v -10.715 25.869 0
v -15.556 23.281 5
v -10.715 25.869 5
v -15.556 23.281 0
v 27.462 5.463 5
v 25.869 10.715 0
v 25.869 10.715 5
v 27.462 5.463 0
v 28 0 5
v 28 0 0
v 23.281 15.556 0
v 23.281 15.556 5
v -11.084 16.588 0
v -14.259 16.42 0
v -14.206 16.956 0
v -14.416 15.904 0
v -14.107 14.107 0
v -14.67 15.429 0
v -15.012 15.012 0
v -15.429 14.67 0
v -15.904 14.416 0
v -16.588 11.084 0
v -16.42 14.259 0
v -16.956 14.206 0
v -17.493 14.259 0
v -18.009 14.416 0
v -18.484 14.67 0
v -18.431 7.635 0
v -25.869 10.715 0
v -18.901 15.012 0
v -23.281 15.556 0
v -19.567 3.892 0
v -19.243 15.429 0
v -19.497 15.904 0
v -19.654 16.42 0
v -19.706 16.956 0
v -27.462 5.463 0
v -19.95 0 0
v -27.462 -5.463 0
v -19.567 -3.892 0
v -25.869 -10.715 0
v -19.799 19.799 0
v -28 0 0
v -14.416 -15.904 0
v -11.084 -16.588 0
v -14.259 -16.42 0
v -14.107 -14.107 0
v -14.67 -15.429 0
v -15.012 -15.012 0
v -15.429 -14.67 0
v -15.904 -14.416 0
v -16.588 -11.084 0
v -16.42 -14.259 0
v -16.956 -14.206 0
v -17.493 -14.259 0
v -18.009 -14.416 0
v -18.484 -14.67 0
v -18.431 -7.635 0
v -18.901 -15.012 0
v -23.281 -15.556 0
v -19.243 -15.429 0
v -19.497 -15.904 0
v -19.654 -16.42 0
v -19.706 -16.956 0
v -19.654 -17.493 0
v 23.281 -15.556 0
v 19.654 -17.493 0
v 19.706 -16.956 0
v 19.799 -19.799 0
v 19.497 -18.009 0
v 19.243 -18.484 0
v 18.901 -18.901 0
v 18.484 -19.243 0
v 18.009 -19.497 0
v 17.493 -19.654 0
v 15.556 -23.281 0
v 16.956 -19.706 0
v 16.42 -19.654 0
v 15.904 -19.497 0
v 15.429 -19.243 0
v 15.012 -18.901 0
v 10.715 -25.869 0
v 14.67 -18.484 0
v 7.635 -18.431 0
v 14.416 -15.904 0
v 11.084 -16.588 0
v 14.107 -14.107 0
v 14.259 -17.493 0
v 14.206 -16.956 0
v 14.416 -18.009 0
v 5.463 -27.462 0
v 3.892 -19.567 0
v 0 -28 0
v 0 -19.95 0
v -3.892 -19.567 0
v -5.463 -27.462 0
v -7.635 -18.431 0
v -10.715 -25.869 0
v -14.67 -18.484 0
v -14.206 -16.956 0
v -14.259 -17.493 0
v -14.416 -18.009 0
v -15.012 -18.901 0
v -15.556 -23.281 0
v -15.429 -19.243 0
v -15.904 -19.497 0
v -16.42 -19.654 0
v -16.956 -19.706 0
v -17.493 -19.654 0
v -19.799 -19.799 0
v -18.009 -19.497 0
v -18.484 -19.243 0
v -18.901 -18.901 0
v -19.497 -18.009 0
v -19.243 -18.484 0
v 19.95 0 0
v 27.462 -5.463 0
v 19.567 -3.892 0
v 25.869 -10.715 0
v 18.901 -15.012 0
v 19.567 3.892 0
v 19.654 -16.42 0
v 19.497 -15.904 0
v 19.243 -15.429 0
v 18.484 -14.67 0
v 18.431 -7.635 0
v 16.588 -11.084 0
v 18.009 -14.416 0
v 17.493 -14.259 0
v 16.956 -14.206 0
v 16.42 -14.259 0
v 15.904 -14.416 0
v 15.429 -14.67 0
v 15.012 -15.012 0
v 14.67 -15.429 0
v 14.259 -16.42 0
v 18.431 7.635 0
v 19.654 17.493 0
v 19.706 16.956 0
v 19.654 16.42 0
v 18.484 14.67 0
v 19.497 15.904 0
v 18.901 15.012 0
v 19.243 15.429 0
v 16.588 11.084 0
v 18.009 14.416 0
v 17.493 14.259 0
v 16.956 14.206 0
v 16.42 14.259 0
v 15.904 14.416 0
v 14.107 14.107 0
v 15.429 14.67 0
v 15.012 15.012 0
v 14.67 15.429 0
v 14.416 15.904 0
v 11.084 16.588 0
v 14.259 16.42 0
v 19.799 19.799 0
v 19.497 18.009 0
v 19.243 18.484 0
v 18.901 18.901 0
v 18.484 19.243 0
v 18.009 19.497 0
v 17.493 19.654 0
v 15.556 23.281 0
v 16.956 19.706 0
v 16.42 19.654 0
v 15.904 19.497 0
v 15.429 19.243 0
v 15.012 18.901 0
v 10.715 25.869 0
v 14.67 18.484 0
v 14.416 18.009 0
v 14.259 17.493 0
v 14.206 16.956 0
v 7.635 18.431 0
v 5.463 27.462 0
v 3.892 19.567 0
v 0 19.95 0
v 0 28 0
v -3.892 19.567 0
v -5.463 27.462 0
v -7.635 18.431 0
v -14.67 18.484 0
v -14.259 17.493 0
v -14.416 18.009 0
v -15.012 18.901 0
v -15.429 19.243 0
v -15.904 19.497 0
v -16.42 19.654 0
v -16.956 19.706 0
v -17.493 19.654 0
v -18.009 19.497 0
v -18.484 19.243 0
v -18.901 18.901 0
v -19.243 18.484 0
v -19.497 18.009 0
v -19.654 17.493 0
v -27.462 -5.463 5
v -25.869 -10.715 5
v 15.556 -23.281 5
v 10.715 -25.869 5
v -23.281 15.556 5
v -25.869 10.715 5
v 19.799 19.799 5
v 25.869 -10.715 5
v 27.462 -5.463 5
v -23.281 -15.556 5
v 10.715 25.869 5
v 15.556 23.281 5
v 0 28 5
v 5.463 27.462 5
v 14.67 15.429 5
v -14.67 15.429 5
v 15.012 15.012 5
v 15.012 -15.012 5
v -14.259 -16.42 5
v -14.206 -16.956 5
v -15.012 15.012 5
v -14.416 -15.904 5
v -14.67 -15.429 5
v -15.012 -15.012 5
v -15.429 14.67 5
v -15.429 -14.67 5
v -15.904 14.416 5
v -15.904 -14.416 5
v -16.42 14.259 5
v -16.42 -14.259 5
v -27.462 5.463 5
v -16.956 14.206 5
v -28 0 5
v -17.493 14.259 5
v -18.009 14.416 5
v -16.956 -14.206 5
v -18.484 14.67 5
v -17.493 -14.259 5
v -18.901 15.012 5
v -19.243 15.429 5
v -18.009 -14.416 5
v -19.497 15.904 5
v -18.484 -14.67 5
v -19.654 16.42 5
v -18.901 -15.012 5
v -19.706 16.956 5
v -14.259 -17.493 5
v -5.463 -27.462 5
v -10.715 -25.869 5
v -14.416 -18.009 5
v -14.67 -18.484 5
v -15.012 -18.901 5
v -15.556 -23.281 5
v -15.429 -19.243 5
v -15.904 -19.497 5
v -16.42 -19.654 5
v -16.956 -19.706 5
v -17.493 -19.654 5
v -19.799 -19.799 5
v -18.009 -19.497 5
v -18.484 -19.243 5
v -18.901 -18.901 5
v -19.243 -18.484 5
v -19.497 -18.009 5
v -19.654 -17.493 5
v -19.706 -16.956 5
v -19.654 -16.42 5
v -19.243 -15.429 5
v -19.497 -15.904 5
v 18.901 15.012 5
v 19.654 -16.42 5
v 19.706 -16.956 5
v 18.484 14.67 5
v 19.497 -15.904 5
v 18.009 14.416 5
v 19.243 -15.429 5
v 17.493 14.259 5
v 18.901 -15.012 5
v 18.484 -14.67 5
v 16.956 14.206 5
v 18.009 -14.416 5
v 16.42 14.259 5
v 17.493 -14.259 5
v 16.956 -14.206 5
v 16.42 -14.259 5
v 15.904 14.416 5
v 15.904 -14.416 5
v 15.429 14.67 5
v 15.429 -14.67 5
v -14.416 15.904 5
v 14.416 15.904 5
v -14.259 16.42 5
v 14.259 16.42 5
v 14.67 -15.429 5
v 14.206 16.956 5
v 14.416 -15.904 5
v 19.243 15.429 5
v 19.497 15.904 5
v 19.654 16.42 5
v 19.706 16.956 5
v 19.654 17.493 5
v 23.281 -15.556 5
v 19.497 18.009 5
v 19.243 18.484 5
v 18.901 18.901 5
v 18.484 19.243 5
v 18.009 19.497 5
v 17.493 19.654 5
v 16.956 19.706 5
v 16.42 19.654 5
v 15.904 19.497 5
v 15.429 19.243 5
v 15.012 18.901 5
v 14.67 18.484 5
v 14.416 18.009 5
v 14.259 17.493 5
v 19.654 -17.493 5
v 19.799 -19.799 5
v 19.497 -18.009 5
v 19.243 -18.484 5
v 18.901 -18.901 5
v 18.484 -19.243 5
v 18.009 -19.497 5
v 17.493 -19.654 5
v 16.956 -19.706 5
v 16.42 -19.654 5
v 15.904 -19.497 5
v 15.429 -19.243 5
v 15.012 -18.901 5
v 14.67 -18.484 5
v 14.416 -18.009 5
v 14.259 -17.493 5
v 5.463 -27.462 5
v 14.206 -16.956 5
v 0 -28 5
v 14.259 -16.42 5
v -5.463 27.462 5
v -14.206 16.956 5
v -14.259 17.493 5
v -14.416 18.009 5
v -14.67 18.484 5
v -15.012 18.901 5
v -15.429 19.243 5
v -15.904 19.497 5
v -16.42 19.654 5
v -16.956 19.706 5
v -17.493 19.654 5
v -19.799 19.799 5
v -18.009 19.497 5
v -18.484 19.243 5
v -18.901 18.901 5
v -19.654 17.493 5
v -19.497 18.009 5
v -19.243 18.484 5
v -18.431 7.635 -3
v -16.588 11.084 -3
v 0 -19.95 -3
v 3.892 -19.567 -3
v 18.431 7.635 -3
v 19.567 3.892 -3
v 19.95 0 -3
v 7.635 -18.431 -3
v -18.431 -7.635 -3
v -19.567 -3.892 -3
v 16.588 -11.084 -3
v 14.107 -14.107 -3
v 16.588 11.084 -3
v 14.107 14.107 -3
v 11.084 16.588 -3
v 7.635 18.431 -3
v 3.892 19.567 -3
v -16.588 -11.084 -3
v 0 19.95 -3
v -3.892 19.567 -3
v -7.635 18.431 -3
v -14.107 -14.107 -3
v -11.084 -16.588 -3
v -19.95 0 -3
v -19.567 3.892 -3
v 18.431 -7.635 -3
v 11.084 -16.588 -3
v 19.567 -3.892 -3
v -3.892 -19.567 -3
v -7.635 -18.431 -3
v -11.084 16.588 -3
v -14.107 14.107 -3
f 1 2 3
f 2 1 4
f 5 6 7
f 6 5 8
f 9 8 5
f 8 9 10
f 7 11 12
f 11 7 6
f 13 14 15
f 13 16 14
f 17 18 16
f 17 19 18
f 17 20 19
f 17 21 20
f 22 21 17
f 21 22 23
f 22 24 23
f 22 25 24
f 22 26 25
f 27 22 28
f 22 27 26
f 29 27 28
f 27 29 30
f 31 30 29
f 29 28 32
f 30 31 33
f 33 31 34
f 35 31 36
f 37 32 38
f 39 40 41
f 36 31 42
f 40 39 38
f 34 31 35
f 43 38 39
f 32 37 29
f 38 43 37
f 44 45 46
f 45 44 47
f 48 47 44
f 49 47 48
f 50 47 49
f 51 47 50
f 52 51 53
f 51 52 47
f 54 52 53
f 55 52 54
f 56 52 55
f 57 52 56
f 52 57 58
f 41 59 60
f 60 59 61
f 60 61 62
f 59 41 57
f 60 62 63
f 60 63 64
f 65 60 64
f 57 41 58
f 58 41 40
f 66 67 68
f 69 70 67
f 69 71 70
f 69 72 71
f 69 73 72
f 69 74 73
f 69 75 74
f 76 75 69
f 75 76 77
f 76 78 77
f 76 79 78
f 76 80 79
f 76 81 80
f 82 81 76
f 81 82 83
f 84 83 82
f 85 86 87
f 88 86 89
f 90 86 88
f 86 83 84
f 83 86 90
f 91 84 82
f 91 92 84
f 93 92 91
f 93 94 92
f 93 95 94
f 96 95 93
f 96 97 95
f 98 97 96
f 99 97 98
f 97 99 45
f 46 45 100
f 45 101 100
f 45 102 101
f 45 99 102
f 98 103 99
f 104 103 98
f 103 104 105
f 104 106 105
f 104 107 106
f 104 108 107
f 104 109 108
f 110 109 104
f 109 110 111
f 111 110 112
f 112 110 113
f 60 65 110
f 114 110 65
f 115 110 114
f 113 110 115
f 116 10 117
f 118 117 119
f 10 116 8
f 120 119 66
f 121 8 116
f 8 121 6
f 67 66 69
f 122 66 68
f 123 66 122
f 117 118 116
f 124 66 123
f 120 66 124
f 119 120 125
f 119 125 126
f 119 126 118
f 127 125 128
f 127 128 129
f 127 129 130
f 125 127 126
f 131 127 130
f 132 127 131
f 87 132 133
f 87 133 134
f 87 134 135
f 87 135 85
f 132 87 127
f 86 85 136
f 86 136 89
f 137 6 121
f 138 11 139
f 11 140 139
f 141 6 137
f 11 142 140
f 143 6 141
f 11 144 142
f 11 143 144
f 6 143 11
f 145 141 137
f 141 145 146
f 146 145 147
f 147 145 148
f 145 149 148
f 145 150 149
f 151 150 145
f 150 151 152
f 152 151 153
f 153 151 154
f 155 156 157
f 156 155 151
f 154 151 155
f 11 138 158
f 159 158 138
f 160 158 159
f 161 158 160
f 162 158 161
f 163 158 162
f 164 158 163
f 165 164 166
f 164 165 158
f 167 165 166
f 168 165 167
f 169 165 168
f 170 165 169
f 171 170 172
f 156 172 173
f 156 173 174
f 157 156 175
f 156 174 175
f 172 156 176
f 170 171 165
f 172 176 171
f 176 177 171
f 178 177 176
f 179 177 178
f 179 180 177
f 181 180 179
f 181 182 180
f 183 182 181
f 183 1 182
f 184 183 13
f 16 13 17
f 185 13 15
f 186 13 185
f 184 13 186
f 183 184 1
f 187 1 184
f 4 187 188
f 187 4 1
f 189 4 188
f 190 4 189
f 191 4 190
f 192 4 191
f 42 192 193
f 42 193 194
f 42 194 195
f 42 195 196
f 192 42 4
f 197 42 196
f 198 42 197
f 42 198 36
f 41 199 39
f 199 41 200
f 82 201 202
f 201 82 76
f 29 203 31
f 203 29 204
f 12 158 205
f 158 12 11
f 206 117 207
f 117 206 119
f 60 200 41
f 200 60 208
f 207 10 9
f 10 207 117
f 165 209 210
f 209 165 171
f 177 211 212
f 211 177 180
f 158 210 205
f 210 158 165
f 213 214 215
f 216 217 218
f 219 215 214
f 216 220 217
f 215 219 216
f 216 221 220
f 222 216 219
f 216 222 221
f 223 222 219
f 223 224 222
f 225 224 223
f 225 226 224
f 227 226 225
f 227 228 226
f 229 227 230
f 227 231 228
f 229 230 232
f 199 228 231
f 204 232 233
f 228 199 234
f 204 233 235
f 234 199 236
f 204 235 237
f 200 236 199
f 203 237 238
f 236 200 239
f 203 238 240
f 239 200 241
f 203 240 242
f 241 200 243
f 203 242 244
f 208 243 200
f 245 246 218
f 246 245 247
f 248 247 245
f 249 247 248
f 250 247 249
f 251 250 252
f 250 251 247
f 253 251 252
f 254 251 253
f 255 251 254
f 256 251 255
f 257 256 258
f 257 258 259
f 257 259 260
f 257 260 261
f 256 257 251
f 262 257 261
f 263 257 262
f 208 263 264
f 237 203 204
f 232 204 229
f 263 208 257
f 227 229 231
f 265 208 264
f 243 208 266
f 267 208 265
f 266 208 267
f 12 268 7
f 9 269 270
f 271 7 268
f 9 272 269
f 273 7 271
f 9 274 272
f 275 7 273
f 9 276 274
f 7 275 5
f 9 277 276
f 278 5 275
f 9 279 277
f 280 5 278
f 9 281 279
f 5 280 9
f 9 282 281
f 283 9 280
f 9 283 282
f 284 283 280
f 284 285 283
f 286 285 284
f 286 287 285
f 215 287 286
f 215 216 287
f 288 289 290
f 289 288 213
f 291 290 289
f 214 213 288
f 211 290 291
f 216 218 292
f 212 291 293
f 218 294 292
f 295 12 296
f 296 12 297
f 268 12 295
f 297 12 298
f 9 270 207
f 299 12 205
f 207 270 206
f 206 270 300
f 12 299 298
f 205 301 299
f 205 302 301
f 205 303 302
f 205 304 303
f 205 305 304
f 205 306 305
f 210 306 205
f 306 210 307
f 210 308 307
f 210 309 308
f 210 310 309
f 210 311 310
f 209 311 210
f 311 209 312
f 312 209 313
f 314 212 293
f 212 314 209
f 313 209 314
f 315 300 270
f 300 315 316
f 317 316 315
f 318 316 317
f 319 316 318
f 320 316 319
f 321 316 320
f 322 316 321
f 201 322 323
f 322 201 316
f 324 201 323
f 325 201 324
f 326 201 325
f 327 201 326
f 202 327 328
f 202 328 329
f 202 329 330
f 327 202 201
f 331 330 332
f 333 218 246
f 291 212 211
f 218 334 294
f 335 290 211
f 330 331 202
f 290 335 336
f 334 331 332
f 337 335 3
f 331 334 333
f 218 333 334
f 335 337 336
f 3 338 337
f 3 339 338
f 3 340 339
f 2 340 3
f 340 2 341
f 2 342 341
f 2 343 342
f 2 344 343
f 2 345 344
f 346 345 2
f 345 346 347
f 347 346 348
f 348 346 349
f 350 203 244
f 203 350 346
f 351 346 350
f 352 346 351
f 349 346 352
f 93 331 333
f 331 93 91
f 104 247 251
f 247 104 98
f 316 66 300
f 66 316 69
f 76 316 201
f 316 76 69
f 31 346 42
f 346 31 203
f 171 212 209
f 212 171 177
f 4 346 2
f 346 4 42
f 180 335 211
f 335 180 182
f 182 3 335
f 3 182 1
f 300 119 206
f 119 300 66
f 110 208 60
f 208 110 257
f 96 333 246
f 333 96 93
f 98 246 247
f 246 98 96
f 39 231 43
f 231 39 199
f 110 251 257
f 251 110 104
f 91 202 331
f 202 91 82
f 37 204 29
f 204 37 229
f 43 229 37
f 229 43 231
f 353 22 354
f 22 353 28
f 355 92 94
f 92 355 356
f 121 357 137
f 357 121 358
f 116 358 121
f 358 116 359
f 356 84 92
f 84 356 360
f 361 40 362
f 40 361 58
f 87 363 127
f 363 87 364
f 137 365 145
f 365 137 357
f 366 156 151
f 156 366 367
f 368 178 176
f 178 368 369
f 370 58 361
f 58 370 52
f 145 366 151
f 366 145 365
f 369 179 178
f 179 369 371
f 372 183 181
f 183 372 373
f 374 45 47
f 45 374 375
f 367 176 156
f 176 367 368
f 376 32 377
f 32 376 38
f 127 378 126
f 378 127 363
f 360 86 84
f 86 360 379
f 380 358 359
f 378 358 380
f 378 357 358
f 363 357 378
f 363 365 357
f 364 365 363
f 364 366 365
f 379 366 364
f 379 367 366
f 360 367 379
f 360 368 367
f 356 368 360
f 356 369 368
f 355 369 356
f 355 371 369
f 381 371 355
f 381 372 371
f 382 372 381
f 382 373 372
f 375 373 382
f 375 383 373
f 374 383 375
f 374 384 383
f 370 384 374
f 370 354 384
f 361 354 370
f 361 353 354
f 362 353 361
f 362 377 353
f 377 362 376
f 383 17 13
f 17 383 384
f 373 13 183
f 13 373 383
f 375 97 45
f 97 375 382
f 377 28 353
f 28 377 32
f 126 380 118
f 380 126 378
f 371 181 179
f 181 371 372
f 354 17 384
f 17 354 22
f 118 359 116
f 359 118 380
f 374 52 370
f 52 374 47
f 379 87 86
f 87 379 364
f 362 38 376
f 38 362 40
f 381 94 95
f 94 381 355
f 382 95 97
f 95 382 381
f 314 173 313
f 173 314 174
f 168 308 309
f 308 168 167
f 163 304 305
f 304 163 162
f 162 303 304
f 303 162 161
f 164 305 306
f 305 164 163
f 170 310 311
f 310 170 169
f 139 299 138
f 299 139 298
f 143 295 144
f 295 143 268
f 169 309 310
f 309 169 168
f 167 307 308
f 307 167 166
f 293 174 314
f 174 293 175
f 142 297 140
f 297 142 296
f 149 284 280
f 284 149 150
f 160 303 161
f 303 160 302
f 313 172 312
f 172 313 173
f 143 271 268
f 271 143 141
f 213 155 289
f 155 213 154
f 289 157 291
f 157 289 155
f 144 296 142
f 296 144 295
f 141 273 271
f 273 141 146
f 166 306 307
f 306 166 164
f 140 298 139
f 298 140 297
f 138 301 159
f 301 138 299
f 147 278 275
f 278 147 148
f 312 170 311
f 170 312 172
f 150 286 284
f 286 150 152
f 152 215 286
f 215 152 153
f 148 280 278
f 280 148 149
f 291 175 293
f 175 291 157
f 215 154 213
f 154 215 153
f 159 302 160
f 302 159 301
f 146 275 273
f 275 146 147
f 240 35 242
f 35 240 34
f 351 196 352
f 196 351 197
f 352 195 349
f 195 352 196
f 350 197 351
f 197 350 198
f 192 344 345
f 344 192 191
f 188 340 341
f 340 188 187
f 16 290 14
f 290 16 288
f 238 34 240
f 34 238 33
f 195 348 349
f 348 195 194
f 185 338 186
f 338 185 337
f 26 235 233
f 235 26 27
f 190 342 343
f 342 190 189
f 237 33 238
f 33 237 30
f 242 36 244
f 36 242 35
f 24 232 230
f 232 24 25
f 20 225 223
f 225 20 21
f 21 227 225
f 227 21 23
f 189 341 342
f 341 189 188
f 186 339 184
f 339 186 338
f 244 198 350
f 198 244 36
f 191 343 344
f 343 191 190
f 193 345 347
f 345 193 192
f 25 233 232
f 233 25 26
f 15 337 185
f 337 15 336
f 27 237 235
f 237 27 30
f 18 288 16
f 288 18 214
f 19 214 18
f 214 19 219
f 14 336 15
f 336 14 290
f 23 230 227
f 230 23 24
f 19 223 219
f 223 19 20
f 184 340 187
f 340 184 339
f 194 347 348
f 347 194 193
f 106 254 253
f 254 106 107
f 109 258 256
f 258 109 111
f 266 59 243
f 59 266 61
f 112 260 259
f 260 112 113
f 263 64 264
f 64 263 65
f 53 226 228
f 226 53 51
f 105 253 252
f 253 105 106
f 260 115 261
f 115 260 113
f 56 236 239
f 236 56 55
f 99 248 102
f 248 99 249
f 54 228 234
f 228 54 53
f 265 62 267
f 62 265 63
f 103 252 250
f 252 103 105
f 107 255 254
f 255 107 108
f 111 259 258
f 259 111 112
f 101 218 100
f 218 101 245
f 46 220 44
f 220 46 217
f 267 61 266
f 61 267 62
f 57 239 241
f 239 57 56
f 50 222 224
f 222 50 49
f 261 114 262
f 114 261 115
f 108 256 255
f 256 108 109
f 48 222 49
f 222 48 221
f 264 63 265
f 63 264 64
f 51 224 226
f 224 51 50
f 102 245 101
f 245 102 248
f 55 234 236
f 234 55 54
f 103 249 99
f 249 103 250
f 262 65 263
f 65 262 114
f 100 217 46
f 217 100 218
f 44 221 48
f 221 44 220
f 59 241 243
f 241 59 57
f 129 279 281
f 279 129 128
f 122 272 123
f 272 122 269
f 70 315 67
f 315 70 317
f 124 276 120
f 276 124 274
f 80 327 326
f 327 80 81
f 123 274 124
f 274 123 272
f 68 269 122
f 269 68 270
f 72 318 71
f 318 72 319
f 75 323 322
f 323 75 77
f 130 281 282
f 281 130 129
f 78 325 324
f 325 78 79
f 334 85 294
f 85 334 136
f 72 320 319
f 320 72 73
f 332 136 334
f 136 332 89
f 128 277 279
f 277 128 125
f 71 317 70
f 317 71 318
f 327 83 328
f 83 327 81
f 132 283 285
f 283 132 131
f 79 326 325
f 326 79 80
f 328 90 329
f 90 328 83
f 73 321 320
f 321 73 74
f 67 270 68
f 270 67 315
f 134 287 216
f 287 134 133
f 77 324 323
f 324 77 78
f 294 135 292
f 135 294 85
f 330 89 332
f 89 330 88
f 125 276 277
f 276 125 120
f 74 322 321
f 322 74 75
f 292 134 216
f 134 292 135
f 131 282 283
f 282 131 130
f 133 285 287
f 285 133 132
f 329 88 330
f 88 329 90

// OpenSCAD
$fn = 32;

// ----------------------------------------------------------------------
// Retaining cap: 6203 cover, 56 mm, spigot 39.9 mm
// ----------------------------------------------------------------------

// --- parameters (mm) ---
cover_d = 56;             // cover diameter
cover_t = 5;              // cover thickness
spigot_d = 39.9;          // spigot that enters the housing
spigot_h = 3;             // spigot height
bolt_d = 5.5;             // bolt clearance
bolt_r = 23.98;           // bolt circle radius

module cover() {
  cylinder(h = cover_t, d = cover_d);
}

module spigot() {
  /* sunk 1 mm into the cover; the spigot sets the overall height */
  translate([0, 0, -spigot_h]) cylinder(h = spigot_h + 1, d = spigot_d);
}

difference() {
  union() {
    cover();
    spigot();
  }
  for (i = [0 : 3]) rotate([0, 0, 45 + i * 90]) translate([bolt_r, 0, -spigot_h - 1])
    cylinder(h = spigot_h + cover_t + 2, d = bolt_d);
}
